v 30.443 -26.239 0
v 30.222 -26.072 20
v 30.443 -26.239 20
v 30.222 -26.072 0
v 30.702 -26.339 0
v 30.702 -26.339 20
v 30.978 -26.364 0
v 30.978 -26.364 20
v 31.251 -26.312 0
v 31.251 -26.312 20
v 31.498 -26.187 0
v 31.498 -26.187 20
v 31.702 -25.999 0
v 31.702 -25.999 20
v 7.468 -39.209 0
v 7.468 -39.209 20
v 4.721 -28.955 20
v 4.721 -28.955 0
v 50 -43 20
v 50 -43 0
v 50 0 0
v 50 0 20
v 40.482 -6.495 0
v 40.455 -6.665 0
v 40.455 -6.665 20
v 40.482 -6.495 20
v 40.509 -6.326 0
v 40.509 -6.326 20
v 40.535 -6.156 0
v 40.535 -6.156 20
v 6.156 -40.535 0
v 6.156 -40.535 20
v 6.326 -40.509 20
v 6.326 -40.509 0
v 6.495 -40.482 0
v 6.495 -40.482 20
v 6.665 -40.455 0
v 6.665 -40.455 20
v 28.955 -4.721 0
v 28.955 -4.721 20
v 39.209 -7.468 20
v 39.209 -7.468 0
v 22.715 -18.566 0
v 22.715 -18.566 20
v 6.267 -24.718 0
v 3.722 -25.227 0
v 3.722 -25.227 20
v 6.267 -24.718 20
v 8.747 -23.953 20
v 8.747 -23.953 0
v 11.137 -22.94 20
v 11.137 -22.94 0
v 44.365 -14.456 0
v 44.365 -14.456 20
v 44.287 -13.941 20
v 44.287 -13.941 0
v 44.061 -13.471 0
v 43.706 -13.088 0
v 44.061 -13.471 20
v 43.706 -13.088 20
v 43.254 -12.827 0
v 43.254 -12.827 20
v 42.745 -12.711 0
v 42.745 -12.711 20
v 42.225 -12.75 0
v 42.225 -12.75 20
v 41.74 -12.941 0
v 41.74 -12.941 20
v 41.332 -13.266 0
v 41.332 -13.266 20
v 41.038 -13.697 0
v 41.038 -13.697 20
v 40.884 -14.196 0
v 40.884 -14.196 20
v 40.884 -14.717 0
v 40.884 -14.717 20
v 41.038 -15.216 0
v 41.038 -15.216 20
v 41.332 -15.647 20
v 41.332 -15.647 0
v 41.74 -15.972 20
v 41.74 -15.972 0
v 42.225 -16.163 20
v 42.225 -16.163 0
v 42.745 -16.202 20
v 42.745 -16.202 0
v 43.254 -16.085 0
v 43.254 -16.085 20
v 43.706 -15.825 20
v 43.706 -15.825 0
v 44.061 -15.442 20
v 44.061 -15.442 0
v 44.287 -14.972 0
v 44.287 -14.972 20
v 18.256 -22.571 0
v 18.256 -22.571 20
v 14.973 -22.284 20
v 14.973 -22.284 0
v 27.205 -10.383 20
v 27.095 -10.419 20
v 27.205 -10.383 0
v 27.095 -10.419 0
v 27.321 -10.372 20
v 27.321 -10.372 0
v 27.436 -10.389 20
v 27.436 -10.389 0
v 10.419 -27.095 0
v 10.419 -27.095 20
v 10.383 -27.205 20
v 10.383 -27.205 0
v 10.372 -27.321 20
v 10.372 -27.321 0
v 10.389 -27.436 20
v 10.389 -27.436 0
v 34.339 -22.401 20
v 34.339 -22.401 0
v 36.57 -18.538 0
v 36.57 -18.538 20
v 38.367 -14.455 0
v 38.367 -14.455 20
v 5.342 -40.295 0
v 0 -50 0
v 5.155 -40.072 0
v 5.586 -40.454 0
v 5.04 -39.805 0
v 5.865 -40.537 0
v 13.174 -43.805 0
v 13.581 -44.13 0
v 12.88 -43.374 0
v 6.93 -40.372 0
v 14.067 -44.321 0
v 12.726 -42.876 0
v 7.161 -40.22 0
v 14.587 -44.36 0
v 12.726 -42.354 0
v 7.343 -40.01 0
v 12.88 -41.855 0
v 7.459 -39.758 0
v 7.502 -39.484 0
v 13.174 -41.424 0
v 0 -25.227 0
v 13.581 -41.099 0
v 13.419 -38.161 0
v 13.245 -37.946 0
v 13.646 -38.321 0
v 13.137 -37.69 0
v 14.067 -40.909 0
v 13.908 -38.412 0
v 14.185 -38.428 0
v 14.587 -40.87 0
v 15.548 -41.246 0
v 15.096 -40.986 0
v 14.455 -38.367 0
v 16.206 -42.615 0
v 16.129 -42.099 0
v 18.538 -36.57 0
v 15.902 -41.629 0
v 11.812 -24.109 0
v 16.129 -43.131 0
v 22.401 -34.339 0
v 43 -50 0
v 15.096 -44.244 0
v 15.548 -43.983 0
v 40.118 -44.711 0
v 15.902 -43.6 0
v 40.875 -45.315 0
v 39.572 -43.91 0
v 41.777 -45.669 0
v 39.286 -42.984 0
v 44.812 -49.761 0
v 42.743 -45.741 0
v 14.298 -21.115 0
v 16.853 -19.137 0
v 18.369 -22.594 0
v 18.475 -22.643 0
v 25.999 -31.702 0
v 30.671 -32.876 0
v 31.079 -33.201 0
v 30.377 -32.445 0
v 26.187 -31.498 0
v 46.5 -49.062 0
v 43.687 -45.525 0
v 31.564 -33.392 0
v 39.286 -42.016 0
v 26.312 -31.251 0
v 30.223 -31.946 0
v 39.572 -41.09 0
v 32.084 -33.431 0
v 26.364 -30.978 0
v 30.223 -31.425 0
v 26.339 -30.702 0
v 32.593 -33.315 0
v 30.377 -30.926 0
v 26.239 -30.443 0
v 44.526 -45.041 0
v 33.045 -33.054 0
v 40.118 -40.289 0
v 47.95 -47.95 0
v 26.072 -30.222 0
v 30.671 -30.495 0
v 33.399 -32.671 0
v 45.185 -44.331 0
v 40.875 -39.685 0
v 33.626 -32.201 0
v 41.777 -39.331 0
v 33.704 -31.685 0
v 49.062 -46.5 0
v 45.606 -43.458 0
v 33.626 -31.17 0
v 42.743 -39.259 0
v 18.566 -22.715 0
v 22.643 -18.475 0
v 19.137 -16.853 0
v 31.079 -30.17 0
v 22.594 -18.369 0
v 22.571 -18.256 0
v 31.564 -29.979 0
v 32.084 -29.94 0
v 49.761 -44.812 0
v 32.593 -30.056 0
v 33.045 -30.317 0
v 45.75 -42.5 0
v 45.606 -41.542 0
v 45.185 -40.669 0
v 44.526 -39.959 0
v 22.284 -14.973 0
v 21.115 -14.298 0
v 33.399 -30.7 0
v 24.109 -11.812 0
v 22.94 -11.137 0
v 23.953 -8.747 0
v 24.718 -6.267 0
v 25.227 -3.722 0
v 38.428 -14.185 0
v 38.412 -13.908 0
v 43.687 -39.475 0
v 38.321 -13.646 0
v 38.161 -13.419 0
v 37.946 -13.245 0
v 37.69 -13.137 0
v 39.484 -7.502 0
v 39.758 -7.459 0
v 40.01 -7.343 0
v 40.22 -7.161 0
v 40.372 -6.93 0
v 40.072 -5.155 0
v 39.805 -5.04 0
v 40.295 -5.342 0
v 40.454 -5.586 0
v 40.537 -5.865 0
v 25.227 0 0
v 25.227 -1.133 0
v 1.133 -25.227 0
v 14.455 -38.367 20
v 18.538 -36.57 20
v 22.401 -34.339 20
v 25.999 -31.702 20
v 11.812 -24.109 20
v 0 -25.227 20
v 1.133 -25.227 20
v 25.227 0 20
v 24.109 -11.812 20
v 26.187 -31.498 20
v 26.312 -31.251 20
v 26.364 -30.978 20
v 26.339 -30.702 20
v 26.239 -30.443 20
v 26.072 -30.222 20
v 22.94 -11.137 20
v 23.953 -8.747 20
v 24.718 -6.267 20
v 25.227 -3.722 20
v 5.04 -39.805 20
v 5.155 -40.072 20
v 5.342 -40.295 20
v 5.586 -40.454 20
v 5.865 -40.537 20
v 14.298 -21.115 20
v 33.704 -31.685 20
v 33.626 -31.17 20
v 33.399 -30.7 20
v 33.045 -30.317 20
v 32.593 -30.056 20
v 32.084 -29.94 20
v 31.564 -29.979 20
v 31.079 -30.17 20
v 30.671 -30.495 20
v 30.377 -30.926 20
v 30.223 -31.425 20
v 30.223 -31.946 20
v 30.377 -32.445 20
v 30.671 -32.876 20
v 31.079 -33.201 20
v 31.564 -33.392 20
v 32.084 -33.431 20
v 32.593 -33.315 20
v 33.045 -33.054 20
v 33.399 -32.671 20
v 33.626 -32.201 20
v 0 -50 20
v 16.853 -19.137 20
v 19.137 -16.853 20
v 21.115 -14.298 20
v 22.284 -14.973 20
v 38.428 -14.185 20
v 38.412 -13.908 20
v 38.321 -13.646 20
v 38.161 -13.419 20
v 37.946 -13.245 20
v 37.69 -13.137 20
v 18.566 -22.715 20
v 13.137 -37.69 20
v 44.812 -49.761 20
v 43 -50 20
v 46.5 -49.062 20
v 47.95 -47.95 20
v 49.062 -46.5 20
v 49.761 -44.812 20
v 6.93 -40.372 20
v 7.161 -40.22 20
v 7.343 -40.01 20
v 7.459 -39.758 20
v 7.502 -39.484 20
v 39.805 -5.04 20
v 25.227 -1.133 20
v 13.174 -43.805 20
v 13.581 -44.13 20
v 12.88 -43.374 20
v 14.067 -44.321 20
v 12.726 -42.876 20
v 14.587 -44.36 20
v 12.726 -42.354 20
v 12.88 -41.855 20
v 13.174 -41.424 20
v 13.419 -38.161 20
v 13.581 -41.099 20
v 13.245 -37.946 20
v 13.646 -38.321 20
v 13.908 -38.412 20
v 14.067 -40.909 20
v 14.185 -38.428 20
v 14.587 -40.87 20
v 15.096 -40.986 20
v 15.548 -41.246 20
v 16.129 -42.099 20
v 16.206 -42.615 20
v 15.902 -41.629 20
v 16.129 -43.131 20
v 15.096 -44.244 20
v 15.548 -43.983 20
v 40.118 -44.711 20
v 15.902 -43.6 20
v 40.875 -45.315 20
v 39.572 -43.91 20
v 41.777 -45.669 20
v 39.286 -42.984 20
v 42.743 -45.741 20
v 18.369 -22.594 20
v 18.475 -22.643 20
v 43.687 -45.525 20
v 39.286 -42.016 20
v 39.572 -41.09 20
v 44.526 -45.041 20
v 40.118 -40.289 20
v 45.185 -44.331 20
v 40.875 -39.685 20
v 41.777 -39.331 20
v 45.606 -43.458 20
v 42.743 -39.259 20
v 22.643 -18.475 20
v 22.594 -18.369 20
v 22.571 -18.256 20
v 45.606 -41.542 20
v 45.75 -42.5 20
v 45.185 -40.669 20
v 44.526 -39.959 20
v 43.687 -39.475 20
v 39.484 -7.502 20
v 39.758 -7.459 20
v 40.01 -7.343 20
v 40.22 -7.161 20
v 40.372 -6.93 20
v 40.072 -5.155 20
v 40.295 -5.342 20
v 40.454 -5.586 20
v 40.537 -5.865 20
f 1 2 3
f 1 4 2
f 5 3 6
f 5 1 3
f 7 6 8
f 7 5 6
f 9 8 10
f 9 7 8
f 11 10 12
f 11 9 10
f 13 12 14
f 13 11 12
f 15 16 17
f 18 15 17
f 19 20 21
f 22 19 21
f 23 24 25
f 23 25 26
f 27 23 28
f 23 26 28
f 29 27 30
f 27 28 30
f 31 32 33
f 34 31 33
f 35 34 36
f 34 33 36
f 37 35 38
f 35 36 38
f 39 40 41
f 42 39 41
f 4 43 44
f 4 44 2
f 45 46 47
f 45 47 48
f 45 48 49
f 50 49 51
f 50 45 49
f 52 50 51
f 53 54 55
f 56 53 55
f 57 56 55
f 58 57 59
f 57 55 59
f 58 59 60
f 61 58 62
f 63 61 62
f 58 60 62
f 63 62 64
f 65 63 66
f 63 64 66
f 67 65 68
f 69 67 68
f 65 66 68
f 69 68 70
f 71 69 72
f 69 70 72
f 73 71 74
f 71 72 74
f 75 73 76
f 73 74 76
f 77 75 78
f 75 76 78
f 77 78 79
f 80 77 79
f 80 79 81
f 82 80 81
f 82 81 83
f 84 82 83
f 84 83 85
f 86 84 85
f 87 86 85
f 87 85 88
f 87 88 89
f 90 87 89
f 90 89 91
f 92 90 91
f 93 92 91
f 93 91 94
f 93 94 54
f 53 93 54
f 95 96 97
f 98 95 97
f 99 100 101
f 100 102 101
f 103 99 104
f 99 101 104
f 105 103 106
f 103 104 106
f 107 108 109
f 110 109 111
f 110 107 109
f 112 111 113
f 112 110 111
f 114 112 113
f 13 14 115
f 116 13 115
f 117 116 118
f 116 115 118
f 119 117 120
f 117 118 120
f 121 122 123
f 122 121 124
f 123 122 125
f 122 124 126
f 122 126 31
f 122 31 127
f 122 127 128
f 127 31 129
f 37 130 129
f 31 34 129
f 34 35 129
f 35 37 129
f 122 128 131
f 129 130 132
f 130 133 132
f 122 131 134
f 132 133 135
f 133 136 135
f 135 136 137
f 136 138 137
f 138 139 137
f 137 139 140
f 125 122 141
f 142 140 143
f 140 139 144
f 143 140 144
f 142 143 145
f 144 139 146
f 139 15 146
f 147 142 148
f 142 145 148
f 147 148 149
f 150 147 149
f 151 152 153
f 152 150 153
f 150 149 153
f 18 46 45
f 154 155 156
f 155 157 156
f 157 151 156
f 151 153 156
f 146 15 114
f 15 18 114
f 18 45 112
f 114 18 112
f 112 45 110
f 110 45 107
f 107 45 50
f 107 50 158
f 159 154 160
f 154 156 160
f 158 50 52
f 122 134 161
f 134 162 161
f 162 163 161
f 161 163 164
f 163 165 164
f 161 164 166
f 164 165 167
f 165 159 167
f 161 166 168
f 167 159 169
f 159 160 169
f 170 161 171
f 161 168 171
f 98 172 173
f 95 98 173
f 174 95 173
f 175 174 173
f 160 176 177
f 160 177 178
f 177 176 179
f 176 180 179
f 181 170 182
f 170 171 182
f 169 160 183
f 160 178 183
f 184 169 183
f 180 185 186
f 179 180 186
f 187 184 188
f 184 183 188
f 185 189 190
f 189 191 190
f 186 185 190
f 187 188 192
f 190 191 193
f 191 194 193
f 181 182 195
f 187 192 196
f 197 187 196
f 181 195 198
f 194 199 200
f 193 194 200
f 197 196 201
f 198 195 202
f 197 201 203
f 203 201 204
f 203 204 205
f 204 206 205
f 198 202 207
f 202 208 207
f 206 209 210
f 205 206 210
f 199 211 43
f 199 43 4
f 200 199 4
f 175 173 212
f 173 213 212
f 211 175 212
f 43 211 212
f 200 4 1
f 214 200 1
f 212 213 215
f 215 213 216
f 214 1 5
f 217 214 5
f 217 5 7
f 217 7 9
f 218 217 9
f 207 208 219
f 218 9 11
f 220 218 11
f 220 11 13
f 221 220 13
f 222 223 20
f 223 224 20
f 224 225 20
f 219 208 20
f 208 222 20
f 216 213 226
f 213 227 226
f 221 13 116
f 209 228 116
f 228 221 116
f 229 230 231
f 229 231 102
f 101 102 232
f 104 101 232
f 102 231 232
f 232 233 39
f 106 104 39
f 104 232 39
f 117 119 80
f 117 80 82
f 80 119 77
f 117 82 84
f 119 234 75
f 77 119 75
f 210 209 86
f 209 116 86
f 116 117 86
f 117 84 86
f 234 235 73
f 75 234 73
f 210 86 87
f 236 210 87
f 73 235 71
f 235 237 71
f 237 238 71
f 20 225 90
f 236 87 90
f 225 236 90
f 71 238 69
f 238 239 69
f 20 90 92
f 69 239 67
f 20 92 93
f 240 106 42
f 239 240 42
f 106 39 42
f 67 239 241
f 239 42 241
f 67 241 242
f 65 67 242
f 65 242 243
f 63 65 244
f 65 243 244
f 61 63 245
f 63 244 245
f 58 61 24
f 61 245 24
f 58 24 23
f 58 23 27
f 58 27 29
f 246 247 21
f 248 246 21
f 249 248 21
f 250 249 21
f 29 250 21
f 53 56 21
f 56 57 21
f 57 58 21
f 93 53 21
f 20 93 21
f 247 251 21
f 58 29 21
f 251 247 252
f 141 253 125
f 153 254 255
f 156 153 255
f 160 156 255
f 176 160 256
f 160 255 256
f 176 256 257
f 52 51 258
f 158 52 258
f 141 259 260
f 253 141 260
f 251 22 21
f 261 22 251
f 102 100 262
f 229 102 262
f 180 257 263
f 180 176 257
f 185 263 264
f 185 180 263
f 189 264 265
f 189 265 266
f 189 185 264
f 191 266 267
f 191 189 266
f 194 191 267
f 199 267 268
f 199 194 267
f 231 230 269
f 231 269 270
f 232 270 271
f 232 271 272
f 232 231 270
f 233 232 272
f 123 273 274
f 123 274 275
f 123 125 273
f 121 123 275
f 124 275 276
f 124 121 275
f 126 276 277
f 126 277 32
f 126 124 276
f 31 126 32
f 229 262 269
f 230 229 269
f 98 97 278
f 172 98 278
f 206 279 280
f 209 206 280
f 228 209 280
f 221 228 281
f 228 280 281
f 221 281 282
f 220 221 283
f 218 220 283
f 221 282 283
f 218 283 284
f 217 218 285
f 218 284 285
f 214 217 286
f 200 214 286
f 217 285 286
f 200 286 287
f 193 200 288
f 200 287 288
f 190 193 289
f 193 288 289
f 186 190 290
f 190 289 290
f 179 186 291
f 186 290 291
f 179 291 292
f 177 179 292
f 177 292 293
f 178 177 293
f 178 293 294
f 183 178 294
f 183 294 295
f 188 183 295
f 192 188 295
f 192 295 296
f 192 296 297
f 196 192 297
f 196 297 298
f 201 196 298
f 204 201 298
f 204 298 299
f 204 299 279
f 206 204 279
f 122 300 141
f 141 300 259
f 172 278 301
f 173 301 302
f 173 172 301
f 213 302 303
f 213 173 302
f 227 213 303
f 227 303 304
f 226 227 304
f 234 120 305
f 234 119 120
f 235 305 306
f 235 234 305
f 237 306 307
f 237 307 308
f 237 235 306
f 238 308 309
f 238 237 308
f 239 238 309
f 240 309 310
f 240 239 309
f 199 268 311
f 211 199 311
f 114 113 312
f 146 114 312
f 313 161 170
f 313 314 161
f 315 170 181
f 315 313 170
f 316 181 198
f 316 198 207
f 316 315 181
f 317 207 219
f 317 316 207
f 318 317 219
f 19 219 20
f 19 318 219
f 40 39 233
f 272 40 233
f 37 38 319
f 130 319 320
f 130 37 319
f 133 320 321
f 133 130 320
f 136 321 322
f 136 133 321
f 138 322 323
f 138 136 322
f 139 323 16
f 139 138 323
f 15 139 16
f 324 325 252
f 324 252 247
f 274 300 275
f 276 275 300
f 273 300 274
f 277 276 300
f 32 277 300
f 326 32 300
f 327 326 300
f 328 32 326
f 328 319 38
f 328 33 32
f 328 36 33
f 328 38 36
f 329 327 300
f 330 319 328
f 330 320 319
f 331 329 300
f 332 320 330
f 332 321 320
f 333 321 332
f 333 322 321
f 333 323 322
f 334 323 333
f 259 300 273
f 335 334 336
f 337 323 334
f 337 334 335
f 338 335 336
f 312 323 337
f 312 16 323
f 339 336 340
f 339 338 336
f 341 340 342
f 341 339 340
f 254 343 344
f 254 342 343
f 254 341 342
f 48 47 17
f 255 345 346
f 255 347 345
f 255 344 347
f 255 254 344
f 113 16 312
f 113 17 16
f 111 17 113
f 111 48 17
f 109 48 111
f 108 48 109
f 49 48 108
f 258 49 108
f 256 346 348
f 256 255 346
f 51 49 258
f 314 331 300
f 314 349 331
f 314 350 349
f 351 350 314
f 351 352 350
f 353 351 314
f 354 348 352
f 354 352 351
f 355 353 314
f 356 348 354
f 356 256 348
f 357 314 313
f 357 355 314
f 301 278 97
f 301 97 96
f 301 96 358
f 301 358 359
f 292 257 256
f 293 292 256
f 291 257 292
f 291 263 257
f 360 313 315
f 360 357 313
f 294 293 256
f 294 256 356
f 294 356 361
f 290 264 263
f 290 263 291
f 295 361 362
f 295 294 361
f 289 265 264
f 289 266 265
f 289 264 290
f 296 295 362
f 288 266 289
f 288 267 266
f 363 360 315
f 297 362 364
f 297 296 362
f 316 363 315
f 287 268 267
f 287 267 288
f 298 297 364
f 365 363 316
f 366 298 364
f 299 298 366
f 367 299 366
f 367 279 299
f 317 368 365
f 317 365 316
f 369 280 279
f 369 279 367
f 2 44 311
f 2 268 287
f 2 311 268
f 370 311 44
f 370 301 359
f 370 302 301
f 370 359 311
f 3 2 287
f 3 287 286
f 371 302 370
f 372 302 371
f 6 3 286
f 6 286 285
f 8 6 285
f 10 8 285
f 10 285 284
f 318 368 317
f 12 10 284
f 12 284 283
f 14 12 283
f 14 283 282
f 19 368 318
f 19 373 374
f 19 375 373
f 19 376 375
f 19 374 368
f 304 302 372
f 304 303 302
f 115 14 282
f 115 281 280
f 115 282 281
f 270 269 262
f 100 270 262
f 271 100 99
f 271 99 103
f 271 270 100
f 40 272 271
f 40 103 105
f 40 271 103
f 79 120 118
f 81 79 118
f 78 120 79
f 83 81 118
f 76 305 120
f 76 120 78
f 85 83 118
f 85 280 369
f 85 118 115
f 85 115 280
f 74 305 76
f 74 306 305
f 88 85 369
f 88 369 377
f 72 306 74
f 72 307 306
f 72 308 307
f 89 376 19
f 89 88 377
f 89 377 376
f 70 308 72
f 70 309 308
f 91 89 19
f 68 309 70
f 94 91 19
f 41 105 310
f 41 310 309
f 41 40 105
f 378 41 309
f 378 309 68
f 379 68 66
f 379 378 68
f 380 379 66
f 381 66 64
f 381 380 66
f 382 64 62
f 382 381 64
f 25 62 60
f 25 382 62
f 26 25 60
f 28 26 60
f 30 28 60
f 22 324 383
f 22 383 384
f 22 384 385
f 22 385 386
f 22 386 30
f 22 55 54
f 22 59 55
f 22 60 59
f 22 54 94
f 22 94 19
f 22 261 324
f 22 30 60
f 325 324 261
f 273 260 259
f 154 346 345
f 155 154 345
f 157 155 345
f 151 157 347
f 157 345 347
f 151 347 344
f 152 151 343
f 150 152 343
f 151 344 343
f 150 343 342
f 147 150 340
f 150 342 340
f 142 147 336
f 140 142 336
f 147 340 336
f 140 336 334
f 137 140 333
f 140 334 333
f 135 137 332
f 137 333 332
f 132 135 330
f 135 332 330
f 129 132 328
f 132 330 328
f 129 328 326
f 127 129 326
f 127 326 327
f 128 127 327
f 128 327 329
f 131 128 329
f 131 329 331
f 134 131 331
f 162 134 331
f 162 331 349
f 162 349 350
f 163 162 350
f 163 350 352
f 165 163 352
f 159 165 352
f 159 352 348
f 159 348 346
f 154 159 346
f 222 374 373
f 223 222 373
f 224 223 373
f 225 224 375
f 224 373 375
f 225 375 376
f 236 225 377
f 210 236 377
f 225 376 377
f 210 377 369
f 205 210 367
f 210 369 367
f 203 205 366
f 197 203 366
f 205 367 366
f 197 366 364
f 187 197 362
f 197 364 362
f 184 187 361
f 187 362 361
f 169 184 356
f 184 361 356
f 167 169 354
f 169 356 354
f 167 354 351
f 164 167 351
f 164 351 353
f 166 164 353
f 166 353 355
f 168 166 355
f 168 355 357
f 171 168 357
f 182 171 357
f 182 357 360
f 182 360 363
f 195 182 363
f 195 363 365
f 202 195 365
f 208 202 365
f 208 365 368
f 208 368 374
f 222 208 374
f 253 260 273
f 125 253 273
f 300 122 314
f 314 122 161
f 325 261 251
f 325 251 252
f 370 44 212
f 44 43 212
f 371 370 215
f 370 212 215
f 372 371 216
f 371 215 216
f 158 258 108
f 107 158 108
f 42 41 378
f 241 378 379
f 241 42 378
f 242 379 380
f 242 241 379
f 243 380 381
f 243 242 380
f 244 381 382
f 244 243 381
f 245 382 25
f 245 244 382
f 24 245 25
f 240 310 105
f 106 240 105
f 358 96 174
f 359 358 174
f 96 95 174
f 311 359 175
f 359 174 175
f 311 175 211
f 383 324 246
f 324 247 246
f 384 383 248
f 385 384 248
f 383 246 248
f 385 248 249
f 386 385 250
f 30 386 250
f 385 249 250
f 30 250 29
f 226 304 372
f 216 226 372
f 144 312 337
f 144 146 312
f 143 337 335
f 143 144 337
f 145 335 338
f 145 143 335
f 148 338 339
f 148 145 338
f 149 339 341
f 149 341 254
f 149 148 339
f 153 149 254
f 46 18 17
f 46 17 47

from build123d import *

# Parameters (mm, degrees)
SKETCH1_W                              = 100
SKETCH1_H                              = 100
SKETCH1_R                              = 25.5
LAMINATION_EXTRUCTION_DEPTH            = 20
SLOT_CUT_DEPTH                         = 74.484692283
SLOT_FILLET_TOP_R                      = 1
SLOT_FILLET_BOTTOM_R                   = 0.5
SLOT_DUPLICATE_COUNT                   = 12
SLOT_FILLET_TOP_OF_SLOT_DUPLICATE_R    = 1
SLOT_FILLET_BOTTOM_OF_SLOT_DUPLICATE_R = 0.5
SKETCH3_R                              = 3.25
BOLT_HOLE_CUT_DEPTH                    = 74.484692283
CORNER_FILLET_R                        = 7
SKETCH4_W                              = 50
SKETCH4_H                              = 100
CUT_EXTRUDE1_DEPTH                     = 74.484692283
SKETCH5_W                              = 50
SKETCH5_H                              = 50
CUT_EXTRUDE2_DEPTH                     = 74.484692283
SKETCH6_R                              = 1.75
CUT_EXTRUDE3_DEPTH                     = 74.484692283
CUT_EXTRUDE4_DEPTH                     = 74.484692283
BOSS_EXTRUDE1_START                    = -20
BOSS_EXTRUDE1_DEPTH                    = 20
FILLET1_R                              = 1


with BuildPart() as part:
    # Sketch1 → Lamination Extruction (new body)
    with BuildSketch(Plane.XY):
        Rectangle(SKETCH1_W, SKETCH1_H)
        Circle(SKETCH1_R, mode=Mode.SUBTRACT)
    extrude(amount=LAMINATION_EXTRUCTION_DEPTH)

    # Sketch2 → Slot Cut (cut, through all)
    with BuildSketch(Plane.XY.offset(20)):
        with BuildLine():
            Line((4.673479277, 28.779136449), (7.75, 40.260868098))
            ThreePointArc((7.75, 40.260868098), (0, 41), (-7.75, 40.260868098))
            Line((-7.75, 40.260868098), (-4.673479277, 28.779136449))
            Line((-4.673479277, 28.779136449), (-1.825, 26.784609787))
            Line((-1.825, 26.784609787), (-1.825, 25.434609787))
            ThreePointArc((-1.825, 25.434609787), (0, 25.5), (1.825, 25.434609787))
            Line((1.825, 25.434609787), (1.825, 26.784609787))
            Line((1.825, 26.784609787), (4.673479277, 28.779136449))
        make_face()
    slot_cut = extrude(amount=-SLOT_CUT_DEPTH, mode=Mode.SUBTRACT)

    # Slot Fillet Top
    slot_fillet_top_edges = [part.edges().sort_by_distance(p)[0] for p in [
        (-7.75, 40.260868098, 10),
        (7.75, 40.260868098, 10),
    ]]
    fillet(slot_fillet_top_edges, radius=SLOT_FILLET_TOP_R)

    # Slot Fillet Bottom
    slot_fillet_bottom_edges = [part.edges().sort_by_distance(p)[0] for p in [
        (4.673479277, 28.779136449, 10),
        (-4.673479277, 28.779136449, 10),
    ]]
    fillet(slot_fillet_bottom_edges, radius=SLOT_FILLET_BOTTOM_R)

    # Slot Duplicate: Slot Cut ×12 about axis
    slot_duplicate_axis = Axis((0, 0, 0), (0, 0, 1))
    for i in range(1, SLOT_DUPLICATE_COUNT):
        add(slot_cut.rotate(slot_duplicate_axis, i * 360 / SLOT_DUPLICATE_COUNT), mode=Mode.SUBTRACT)

    # Slot Fillet Top of Slot Duplicate
    slot_fillet_top_of_slot_duplicate_edges = [part.edges().sort_by_distance(p)[0] for p in [
        (-26.842130928, 30.991934551, 10),
        (-13.41873717, 38.741934551, 10),
        (-38.741934551, 13.41873717, 10),
        (-30.991934551, 26.842130928, 10),
        (-40.260868098, -7.75, 10),
        (-40.260868098, 7.75, 10),
        (-30.991934551, -26.842130928, 10),
        (-38.741934551, -13.41873717, 10),
        (-13.41873717, -38.741934551, 10),
        (-26.842130928, -30.991934551, 10),
        (7.75, -40.260868098, 10),
        (-7.75, -40.260868098, 10),
        (26.842130928, -30.991934551, 10),
        (13.41873717, -38.741934551, 10),
        (38.741934551, -13.41873717, 10),
        (30.991934551, -26.842130928, 10),
        (40.260868098, 7.75, 10),
        (40.260868098, -7.75, 10),
        (30.991934551, 26.842130928, 10),
        (38.741934551, 13.41873717, 10),
        (13.41873717, 38.741934551, 10),
        (26.842130928, 30.991934551, 10),
    ]]
    fillet(slot_fillet_top_of_slot_duplicate_edges, radius=SLOT_FILLET_TOP_OF_SLOT_DUPLICATE_R)

    # Slot Fillet Bottom of Slot Duplicate
    slot_fillet_bottom_of_slot_duplicate_edges = [part.edges().sort_by_distance(p)[0] for p in [
        (-10.342216447, 27.260202902, 10),
        (-18.436920002, 22.586723625, 10),
        (-22.586723625, 18.436920002, 10),
        (-27.260202902, 10.342216447, 10),
        (-28.779136449, 4.673479277, 10),
        (-28.779136449, -4.673479277, 10),
        (-27.260202902, -10.342216447, 10),
        (-22.586723625, -18.436920002, 10),
        (-18.436920002, -22.586723625, 10),
        (-10.342216447, -27.260202902, 10),
        (-4.673479277, -28.779136449, 10),
        (4.673479277, -28.779136449, 10),
        (10.342216447, -27.260202902, 10),
        (18.436920002, -22.586723625, 10),
        (22.586723625, -18.436920002, 10),
        (27.260202902, -10.342216447, 10),
        (28.779136449, -4.673479277, 10),
        (28.779136449, 4.673479277, 10),
        (27.260202902, 10.342216447, 10),
        (22.586723625, 18.436920002, 10),
        (18.436920002, 22.586723625, 10),
        (10.342216447, 27.260202902, 10),
    ]]
    fillet(slot_fillet_bottom_of_slot_duplicate_edges, radius=SLOT_FILLET_BOTTOM_OF_SLOT_DUPLICATE_R)

    # Sketch3 → Bolt Hole Cut (cut, through all)
    with BuildSketch(Plane.XY.offset(20)):
        with Locations((-42.5, 42.5)):
            Circle(SKETCH3_R)
        with Locations((42.5, 42.5)):
            Circle(SKETCH3_R)
        with Locations((42.5, -42.5)):
            Circle(SKETCH3_R)
        with Locations((-42.5, -42.5)):
            Circle(SKETCH3_R)
    extrude(amount=-BOLT_HOLE_CUT_DEPTH, mode=Mode.SUBTRACT)

    # Corner Fillet
    corner_fillet_edges = [part.edges().sort_by_distance(p)[0] for p in [
        (-50, 50, 10),
        (50, 50, 10),
        (50, -50, 10),
        (-50, -50, 10),
    ]]
    fillet(corner_fillet_edges, radius=CORNER_FILLET_R)

    # Sketch4 → Cut-Extrude1 (cut, through all)
    with BuildSketch(Plane.XY.offset(20)):
        with Locations((-25, 0)):
            Rectangle(SKETCH4_W, SKETCH4_H)
    extrude(amount=-CUT_EXTRUDE1_DEPTH, mode=Mode.SUBTRACT)

    # Sketch5 → Cut-Extrude2 (cut, through all)
    with BuildSketch(Plane.XY.offset(20)):
        with Locations((25, 25)):
            Rectangle(SKETCH5_W, SKETCH5_H)
    extrude(amount=-CUT_EXTRUDE2_DEPTH, mode=Mode.SUBTRACT)

    # Sketch6 → Cut-Extrude3 (cut, through all)
    with BuildSketch(Plane.XY.offset(20)):
        with Locations((42.614685392, -14.45643763)):
            Circle(SKETCH6_R)
        with Locations((14.45643763, -42.614685392)):
            Circle(SKETCH6_R)
        with Locations((31.95356776, -31.685477863)):
            Circle(SKETCH6_R)
    extrude(amount=-CUT_EXTRUDE3_DEPTH, mode=Mode.SUBTRACT)

    # Sketch7 → Cut-Extrude4 (cut, through all)
    with BuildSketch(Plane(origin=(0, 0, 0), x_dir=(-1, 0, 0), z_dir=(0, 0, -1))):
        Polygon((-7.468192794, -39.209149287), (-3.721674491, -25.22695263), (0, -25.22695263), (0, -41), align=None)
        Polygon((-39.209149287, -7.468192794), (-25.22695263, -3.721674491), (-25.22695263, 0), (-41, 0), align=None)
    extrude(amount=-CUT_EXTRUDE4_DEPTH, mode=Mode.SUBTRACT)

    # Sketch8 → Boss-Extrude1 (add)
    with BuildSketch(Plane(origin=(0, 0, 0), x_dir=(-1, 0, 0), z_dir=(0, 0, -1)).offset(BOSS_EXTRUDE1_START)):
        with BuildLine():
            Line((-25.22695263, -1.13348404), (-40.660054712, -5.26877128))
            ThreePointArc((-40.660054712, -5.26877128), (-40.914925414, -2.63986333), (-41, 0))
            Line((-41, 0), (-25.22695263, 0))
            Line((-25.22695263, 0), (-25.22695263, -1.13348404))
        make_face()
        with BuildLine():
            Line((0, -41), (0, -25.22695263))
            Line((0, -25.22695263), (-1.13348404, -25.22695263))
            Line((-1.13348404, -25.22695263), (-5.26877128, -40.660054712))
            ThreePointArc((-5.26877128, -40.660054712), (-2.63986333, -40.914925414), (0, -41))
        make_face()
    extrude(amount=BOSS_EXTRUDE1_DEPTH)

    # Fillet1
    fillet1_edges = [part.edges().sort_by_distance(p)[0] for p in [
        (40.660054712, -5.26877128, 10),
        (5.26877128, -40.660054712, 10),
    ]]
    fillet(fillet1_edges, radius=FILLET1_R)


solid = part.part
